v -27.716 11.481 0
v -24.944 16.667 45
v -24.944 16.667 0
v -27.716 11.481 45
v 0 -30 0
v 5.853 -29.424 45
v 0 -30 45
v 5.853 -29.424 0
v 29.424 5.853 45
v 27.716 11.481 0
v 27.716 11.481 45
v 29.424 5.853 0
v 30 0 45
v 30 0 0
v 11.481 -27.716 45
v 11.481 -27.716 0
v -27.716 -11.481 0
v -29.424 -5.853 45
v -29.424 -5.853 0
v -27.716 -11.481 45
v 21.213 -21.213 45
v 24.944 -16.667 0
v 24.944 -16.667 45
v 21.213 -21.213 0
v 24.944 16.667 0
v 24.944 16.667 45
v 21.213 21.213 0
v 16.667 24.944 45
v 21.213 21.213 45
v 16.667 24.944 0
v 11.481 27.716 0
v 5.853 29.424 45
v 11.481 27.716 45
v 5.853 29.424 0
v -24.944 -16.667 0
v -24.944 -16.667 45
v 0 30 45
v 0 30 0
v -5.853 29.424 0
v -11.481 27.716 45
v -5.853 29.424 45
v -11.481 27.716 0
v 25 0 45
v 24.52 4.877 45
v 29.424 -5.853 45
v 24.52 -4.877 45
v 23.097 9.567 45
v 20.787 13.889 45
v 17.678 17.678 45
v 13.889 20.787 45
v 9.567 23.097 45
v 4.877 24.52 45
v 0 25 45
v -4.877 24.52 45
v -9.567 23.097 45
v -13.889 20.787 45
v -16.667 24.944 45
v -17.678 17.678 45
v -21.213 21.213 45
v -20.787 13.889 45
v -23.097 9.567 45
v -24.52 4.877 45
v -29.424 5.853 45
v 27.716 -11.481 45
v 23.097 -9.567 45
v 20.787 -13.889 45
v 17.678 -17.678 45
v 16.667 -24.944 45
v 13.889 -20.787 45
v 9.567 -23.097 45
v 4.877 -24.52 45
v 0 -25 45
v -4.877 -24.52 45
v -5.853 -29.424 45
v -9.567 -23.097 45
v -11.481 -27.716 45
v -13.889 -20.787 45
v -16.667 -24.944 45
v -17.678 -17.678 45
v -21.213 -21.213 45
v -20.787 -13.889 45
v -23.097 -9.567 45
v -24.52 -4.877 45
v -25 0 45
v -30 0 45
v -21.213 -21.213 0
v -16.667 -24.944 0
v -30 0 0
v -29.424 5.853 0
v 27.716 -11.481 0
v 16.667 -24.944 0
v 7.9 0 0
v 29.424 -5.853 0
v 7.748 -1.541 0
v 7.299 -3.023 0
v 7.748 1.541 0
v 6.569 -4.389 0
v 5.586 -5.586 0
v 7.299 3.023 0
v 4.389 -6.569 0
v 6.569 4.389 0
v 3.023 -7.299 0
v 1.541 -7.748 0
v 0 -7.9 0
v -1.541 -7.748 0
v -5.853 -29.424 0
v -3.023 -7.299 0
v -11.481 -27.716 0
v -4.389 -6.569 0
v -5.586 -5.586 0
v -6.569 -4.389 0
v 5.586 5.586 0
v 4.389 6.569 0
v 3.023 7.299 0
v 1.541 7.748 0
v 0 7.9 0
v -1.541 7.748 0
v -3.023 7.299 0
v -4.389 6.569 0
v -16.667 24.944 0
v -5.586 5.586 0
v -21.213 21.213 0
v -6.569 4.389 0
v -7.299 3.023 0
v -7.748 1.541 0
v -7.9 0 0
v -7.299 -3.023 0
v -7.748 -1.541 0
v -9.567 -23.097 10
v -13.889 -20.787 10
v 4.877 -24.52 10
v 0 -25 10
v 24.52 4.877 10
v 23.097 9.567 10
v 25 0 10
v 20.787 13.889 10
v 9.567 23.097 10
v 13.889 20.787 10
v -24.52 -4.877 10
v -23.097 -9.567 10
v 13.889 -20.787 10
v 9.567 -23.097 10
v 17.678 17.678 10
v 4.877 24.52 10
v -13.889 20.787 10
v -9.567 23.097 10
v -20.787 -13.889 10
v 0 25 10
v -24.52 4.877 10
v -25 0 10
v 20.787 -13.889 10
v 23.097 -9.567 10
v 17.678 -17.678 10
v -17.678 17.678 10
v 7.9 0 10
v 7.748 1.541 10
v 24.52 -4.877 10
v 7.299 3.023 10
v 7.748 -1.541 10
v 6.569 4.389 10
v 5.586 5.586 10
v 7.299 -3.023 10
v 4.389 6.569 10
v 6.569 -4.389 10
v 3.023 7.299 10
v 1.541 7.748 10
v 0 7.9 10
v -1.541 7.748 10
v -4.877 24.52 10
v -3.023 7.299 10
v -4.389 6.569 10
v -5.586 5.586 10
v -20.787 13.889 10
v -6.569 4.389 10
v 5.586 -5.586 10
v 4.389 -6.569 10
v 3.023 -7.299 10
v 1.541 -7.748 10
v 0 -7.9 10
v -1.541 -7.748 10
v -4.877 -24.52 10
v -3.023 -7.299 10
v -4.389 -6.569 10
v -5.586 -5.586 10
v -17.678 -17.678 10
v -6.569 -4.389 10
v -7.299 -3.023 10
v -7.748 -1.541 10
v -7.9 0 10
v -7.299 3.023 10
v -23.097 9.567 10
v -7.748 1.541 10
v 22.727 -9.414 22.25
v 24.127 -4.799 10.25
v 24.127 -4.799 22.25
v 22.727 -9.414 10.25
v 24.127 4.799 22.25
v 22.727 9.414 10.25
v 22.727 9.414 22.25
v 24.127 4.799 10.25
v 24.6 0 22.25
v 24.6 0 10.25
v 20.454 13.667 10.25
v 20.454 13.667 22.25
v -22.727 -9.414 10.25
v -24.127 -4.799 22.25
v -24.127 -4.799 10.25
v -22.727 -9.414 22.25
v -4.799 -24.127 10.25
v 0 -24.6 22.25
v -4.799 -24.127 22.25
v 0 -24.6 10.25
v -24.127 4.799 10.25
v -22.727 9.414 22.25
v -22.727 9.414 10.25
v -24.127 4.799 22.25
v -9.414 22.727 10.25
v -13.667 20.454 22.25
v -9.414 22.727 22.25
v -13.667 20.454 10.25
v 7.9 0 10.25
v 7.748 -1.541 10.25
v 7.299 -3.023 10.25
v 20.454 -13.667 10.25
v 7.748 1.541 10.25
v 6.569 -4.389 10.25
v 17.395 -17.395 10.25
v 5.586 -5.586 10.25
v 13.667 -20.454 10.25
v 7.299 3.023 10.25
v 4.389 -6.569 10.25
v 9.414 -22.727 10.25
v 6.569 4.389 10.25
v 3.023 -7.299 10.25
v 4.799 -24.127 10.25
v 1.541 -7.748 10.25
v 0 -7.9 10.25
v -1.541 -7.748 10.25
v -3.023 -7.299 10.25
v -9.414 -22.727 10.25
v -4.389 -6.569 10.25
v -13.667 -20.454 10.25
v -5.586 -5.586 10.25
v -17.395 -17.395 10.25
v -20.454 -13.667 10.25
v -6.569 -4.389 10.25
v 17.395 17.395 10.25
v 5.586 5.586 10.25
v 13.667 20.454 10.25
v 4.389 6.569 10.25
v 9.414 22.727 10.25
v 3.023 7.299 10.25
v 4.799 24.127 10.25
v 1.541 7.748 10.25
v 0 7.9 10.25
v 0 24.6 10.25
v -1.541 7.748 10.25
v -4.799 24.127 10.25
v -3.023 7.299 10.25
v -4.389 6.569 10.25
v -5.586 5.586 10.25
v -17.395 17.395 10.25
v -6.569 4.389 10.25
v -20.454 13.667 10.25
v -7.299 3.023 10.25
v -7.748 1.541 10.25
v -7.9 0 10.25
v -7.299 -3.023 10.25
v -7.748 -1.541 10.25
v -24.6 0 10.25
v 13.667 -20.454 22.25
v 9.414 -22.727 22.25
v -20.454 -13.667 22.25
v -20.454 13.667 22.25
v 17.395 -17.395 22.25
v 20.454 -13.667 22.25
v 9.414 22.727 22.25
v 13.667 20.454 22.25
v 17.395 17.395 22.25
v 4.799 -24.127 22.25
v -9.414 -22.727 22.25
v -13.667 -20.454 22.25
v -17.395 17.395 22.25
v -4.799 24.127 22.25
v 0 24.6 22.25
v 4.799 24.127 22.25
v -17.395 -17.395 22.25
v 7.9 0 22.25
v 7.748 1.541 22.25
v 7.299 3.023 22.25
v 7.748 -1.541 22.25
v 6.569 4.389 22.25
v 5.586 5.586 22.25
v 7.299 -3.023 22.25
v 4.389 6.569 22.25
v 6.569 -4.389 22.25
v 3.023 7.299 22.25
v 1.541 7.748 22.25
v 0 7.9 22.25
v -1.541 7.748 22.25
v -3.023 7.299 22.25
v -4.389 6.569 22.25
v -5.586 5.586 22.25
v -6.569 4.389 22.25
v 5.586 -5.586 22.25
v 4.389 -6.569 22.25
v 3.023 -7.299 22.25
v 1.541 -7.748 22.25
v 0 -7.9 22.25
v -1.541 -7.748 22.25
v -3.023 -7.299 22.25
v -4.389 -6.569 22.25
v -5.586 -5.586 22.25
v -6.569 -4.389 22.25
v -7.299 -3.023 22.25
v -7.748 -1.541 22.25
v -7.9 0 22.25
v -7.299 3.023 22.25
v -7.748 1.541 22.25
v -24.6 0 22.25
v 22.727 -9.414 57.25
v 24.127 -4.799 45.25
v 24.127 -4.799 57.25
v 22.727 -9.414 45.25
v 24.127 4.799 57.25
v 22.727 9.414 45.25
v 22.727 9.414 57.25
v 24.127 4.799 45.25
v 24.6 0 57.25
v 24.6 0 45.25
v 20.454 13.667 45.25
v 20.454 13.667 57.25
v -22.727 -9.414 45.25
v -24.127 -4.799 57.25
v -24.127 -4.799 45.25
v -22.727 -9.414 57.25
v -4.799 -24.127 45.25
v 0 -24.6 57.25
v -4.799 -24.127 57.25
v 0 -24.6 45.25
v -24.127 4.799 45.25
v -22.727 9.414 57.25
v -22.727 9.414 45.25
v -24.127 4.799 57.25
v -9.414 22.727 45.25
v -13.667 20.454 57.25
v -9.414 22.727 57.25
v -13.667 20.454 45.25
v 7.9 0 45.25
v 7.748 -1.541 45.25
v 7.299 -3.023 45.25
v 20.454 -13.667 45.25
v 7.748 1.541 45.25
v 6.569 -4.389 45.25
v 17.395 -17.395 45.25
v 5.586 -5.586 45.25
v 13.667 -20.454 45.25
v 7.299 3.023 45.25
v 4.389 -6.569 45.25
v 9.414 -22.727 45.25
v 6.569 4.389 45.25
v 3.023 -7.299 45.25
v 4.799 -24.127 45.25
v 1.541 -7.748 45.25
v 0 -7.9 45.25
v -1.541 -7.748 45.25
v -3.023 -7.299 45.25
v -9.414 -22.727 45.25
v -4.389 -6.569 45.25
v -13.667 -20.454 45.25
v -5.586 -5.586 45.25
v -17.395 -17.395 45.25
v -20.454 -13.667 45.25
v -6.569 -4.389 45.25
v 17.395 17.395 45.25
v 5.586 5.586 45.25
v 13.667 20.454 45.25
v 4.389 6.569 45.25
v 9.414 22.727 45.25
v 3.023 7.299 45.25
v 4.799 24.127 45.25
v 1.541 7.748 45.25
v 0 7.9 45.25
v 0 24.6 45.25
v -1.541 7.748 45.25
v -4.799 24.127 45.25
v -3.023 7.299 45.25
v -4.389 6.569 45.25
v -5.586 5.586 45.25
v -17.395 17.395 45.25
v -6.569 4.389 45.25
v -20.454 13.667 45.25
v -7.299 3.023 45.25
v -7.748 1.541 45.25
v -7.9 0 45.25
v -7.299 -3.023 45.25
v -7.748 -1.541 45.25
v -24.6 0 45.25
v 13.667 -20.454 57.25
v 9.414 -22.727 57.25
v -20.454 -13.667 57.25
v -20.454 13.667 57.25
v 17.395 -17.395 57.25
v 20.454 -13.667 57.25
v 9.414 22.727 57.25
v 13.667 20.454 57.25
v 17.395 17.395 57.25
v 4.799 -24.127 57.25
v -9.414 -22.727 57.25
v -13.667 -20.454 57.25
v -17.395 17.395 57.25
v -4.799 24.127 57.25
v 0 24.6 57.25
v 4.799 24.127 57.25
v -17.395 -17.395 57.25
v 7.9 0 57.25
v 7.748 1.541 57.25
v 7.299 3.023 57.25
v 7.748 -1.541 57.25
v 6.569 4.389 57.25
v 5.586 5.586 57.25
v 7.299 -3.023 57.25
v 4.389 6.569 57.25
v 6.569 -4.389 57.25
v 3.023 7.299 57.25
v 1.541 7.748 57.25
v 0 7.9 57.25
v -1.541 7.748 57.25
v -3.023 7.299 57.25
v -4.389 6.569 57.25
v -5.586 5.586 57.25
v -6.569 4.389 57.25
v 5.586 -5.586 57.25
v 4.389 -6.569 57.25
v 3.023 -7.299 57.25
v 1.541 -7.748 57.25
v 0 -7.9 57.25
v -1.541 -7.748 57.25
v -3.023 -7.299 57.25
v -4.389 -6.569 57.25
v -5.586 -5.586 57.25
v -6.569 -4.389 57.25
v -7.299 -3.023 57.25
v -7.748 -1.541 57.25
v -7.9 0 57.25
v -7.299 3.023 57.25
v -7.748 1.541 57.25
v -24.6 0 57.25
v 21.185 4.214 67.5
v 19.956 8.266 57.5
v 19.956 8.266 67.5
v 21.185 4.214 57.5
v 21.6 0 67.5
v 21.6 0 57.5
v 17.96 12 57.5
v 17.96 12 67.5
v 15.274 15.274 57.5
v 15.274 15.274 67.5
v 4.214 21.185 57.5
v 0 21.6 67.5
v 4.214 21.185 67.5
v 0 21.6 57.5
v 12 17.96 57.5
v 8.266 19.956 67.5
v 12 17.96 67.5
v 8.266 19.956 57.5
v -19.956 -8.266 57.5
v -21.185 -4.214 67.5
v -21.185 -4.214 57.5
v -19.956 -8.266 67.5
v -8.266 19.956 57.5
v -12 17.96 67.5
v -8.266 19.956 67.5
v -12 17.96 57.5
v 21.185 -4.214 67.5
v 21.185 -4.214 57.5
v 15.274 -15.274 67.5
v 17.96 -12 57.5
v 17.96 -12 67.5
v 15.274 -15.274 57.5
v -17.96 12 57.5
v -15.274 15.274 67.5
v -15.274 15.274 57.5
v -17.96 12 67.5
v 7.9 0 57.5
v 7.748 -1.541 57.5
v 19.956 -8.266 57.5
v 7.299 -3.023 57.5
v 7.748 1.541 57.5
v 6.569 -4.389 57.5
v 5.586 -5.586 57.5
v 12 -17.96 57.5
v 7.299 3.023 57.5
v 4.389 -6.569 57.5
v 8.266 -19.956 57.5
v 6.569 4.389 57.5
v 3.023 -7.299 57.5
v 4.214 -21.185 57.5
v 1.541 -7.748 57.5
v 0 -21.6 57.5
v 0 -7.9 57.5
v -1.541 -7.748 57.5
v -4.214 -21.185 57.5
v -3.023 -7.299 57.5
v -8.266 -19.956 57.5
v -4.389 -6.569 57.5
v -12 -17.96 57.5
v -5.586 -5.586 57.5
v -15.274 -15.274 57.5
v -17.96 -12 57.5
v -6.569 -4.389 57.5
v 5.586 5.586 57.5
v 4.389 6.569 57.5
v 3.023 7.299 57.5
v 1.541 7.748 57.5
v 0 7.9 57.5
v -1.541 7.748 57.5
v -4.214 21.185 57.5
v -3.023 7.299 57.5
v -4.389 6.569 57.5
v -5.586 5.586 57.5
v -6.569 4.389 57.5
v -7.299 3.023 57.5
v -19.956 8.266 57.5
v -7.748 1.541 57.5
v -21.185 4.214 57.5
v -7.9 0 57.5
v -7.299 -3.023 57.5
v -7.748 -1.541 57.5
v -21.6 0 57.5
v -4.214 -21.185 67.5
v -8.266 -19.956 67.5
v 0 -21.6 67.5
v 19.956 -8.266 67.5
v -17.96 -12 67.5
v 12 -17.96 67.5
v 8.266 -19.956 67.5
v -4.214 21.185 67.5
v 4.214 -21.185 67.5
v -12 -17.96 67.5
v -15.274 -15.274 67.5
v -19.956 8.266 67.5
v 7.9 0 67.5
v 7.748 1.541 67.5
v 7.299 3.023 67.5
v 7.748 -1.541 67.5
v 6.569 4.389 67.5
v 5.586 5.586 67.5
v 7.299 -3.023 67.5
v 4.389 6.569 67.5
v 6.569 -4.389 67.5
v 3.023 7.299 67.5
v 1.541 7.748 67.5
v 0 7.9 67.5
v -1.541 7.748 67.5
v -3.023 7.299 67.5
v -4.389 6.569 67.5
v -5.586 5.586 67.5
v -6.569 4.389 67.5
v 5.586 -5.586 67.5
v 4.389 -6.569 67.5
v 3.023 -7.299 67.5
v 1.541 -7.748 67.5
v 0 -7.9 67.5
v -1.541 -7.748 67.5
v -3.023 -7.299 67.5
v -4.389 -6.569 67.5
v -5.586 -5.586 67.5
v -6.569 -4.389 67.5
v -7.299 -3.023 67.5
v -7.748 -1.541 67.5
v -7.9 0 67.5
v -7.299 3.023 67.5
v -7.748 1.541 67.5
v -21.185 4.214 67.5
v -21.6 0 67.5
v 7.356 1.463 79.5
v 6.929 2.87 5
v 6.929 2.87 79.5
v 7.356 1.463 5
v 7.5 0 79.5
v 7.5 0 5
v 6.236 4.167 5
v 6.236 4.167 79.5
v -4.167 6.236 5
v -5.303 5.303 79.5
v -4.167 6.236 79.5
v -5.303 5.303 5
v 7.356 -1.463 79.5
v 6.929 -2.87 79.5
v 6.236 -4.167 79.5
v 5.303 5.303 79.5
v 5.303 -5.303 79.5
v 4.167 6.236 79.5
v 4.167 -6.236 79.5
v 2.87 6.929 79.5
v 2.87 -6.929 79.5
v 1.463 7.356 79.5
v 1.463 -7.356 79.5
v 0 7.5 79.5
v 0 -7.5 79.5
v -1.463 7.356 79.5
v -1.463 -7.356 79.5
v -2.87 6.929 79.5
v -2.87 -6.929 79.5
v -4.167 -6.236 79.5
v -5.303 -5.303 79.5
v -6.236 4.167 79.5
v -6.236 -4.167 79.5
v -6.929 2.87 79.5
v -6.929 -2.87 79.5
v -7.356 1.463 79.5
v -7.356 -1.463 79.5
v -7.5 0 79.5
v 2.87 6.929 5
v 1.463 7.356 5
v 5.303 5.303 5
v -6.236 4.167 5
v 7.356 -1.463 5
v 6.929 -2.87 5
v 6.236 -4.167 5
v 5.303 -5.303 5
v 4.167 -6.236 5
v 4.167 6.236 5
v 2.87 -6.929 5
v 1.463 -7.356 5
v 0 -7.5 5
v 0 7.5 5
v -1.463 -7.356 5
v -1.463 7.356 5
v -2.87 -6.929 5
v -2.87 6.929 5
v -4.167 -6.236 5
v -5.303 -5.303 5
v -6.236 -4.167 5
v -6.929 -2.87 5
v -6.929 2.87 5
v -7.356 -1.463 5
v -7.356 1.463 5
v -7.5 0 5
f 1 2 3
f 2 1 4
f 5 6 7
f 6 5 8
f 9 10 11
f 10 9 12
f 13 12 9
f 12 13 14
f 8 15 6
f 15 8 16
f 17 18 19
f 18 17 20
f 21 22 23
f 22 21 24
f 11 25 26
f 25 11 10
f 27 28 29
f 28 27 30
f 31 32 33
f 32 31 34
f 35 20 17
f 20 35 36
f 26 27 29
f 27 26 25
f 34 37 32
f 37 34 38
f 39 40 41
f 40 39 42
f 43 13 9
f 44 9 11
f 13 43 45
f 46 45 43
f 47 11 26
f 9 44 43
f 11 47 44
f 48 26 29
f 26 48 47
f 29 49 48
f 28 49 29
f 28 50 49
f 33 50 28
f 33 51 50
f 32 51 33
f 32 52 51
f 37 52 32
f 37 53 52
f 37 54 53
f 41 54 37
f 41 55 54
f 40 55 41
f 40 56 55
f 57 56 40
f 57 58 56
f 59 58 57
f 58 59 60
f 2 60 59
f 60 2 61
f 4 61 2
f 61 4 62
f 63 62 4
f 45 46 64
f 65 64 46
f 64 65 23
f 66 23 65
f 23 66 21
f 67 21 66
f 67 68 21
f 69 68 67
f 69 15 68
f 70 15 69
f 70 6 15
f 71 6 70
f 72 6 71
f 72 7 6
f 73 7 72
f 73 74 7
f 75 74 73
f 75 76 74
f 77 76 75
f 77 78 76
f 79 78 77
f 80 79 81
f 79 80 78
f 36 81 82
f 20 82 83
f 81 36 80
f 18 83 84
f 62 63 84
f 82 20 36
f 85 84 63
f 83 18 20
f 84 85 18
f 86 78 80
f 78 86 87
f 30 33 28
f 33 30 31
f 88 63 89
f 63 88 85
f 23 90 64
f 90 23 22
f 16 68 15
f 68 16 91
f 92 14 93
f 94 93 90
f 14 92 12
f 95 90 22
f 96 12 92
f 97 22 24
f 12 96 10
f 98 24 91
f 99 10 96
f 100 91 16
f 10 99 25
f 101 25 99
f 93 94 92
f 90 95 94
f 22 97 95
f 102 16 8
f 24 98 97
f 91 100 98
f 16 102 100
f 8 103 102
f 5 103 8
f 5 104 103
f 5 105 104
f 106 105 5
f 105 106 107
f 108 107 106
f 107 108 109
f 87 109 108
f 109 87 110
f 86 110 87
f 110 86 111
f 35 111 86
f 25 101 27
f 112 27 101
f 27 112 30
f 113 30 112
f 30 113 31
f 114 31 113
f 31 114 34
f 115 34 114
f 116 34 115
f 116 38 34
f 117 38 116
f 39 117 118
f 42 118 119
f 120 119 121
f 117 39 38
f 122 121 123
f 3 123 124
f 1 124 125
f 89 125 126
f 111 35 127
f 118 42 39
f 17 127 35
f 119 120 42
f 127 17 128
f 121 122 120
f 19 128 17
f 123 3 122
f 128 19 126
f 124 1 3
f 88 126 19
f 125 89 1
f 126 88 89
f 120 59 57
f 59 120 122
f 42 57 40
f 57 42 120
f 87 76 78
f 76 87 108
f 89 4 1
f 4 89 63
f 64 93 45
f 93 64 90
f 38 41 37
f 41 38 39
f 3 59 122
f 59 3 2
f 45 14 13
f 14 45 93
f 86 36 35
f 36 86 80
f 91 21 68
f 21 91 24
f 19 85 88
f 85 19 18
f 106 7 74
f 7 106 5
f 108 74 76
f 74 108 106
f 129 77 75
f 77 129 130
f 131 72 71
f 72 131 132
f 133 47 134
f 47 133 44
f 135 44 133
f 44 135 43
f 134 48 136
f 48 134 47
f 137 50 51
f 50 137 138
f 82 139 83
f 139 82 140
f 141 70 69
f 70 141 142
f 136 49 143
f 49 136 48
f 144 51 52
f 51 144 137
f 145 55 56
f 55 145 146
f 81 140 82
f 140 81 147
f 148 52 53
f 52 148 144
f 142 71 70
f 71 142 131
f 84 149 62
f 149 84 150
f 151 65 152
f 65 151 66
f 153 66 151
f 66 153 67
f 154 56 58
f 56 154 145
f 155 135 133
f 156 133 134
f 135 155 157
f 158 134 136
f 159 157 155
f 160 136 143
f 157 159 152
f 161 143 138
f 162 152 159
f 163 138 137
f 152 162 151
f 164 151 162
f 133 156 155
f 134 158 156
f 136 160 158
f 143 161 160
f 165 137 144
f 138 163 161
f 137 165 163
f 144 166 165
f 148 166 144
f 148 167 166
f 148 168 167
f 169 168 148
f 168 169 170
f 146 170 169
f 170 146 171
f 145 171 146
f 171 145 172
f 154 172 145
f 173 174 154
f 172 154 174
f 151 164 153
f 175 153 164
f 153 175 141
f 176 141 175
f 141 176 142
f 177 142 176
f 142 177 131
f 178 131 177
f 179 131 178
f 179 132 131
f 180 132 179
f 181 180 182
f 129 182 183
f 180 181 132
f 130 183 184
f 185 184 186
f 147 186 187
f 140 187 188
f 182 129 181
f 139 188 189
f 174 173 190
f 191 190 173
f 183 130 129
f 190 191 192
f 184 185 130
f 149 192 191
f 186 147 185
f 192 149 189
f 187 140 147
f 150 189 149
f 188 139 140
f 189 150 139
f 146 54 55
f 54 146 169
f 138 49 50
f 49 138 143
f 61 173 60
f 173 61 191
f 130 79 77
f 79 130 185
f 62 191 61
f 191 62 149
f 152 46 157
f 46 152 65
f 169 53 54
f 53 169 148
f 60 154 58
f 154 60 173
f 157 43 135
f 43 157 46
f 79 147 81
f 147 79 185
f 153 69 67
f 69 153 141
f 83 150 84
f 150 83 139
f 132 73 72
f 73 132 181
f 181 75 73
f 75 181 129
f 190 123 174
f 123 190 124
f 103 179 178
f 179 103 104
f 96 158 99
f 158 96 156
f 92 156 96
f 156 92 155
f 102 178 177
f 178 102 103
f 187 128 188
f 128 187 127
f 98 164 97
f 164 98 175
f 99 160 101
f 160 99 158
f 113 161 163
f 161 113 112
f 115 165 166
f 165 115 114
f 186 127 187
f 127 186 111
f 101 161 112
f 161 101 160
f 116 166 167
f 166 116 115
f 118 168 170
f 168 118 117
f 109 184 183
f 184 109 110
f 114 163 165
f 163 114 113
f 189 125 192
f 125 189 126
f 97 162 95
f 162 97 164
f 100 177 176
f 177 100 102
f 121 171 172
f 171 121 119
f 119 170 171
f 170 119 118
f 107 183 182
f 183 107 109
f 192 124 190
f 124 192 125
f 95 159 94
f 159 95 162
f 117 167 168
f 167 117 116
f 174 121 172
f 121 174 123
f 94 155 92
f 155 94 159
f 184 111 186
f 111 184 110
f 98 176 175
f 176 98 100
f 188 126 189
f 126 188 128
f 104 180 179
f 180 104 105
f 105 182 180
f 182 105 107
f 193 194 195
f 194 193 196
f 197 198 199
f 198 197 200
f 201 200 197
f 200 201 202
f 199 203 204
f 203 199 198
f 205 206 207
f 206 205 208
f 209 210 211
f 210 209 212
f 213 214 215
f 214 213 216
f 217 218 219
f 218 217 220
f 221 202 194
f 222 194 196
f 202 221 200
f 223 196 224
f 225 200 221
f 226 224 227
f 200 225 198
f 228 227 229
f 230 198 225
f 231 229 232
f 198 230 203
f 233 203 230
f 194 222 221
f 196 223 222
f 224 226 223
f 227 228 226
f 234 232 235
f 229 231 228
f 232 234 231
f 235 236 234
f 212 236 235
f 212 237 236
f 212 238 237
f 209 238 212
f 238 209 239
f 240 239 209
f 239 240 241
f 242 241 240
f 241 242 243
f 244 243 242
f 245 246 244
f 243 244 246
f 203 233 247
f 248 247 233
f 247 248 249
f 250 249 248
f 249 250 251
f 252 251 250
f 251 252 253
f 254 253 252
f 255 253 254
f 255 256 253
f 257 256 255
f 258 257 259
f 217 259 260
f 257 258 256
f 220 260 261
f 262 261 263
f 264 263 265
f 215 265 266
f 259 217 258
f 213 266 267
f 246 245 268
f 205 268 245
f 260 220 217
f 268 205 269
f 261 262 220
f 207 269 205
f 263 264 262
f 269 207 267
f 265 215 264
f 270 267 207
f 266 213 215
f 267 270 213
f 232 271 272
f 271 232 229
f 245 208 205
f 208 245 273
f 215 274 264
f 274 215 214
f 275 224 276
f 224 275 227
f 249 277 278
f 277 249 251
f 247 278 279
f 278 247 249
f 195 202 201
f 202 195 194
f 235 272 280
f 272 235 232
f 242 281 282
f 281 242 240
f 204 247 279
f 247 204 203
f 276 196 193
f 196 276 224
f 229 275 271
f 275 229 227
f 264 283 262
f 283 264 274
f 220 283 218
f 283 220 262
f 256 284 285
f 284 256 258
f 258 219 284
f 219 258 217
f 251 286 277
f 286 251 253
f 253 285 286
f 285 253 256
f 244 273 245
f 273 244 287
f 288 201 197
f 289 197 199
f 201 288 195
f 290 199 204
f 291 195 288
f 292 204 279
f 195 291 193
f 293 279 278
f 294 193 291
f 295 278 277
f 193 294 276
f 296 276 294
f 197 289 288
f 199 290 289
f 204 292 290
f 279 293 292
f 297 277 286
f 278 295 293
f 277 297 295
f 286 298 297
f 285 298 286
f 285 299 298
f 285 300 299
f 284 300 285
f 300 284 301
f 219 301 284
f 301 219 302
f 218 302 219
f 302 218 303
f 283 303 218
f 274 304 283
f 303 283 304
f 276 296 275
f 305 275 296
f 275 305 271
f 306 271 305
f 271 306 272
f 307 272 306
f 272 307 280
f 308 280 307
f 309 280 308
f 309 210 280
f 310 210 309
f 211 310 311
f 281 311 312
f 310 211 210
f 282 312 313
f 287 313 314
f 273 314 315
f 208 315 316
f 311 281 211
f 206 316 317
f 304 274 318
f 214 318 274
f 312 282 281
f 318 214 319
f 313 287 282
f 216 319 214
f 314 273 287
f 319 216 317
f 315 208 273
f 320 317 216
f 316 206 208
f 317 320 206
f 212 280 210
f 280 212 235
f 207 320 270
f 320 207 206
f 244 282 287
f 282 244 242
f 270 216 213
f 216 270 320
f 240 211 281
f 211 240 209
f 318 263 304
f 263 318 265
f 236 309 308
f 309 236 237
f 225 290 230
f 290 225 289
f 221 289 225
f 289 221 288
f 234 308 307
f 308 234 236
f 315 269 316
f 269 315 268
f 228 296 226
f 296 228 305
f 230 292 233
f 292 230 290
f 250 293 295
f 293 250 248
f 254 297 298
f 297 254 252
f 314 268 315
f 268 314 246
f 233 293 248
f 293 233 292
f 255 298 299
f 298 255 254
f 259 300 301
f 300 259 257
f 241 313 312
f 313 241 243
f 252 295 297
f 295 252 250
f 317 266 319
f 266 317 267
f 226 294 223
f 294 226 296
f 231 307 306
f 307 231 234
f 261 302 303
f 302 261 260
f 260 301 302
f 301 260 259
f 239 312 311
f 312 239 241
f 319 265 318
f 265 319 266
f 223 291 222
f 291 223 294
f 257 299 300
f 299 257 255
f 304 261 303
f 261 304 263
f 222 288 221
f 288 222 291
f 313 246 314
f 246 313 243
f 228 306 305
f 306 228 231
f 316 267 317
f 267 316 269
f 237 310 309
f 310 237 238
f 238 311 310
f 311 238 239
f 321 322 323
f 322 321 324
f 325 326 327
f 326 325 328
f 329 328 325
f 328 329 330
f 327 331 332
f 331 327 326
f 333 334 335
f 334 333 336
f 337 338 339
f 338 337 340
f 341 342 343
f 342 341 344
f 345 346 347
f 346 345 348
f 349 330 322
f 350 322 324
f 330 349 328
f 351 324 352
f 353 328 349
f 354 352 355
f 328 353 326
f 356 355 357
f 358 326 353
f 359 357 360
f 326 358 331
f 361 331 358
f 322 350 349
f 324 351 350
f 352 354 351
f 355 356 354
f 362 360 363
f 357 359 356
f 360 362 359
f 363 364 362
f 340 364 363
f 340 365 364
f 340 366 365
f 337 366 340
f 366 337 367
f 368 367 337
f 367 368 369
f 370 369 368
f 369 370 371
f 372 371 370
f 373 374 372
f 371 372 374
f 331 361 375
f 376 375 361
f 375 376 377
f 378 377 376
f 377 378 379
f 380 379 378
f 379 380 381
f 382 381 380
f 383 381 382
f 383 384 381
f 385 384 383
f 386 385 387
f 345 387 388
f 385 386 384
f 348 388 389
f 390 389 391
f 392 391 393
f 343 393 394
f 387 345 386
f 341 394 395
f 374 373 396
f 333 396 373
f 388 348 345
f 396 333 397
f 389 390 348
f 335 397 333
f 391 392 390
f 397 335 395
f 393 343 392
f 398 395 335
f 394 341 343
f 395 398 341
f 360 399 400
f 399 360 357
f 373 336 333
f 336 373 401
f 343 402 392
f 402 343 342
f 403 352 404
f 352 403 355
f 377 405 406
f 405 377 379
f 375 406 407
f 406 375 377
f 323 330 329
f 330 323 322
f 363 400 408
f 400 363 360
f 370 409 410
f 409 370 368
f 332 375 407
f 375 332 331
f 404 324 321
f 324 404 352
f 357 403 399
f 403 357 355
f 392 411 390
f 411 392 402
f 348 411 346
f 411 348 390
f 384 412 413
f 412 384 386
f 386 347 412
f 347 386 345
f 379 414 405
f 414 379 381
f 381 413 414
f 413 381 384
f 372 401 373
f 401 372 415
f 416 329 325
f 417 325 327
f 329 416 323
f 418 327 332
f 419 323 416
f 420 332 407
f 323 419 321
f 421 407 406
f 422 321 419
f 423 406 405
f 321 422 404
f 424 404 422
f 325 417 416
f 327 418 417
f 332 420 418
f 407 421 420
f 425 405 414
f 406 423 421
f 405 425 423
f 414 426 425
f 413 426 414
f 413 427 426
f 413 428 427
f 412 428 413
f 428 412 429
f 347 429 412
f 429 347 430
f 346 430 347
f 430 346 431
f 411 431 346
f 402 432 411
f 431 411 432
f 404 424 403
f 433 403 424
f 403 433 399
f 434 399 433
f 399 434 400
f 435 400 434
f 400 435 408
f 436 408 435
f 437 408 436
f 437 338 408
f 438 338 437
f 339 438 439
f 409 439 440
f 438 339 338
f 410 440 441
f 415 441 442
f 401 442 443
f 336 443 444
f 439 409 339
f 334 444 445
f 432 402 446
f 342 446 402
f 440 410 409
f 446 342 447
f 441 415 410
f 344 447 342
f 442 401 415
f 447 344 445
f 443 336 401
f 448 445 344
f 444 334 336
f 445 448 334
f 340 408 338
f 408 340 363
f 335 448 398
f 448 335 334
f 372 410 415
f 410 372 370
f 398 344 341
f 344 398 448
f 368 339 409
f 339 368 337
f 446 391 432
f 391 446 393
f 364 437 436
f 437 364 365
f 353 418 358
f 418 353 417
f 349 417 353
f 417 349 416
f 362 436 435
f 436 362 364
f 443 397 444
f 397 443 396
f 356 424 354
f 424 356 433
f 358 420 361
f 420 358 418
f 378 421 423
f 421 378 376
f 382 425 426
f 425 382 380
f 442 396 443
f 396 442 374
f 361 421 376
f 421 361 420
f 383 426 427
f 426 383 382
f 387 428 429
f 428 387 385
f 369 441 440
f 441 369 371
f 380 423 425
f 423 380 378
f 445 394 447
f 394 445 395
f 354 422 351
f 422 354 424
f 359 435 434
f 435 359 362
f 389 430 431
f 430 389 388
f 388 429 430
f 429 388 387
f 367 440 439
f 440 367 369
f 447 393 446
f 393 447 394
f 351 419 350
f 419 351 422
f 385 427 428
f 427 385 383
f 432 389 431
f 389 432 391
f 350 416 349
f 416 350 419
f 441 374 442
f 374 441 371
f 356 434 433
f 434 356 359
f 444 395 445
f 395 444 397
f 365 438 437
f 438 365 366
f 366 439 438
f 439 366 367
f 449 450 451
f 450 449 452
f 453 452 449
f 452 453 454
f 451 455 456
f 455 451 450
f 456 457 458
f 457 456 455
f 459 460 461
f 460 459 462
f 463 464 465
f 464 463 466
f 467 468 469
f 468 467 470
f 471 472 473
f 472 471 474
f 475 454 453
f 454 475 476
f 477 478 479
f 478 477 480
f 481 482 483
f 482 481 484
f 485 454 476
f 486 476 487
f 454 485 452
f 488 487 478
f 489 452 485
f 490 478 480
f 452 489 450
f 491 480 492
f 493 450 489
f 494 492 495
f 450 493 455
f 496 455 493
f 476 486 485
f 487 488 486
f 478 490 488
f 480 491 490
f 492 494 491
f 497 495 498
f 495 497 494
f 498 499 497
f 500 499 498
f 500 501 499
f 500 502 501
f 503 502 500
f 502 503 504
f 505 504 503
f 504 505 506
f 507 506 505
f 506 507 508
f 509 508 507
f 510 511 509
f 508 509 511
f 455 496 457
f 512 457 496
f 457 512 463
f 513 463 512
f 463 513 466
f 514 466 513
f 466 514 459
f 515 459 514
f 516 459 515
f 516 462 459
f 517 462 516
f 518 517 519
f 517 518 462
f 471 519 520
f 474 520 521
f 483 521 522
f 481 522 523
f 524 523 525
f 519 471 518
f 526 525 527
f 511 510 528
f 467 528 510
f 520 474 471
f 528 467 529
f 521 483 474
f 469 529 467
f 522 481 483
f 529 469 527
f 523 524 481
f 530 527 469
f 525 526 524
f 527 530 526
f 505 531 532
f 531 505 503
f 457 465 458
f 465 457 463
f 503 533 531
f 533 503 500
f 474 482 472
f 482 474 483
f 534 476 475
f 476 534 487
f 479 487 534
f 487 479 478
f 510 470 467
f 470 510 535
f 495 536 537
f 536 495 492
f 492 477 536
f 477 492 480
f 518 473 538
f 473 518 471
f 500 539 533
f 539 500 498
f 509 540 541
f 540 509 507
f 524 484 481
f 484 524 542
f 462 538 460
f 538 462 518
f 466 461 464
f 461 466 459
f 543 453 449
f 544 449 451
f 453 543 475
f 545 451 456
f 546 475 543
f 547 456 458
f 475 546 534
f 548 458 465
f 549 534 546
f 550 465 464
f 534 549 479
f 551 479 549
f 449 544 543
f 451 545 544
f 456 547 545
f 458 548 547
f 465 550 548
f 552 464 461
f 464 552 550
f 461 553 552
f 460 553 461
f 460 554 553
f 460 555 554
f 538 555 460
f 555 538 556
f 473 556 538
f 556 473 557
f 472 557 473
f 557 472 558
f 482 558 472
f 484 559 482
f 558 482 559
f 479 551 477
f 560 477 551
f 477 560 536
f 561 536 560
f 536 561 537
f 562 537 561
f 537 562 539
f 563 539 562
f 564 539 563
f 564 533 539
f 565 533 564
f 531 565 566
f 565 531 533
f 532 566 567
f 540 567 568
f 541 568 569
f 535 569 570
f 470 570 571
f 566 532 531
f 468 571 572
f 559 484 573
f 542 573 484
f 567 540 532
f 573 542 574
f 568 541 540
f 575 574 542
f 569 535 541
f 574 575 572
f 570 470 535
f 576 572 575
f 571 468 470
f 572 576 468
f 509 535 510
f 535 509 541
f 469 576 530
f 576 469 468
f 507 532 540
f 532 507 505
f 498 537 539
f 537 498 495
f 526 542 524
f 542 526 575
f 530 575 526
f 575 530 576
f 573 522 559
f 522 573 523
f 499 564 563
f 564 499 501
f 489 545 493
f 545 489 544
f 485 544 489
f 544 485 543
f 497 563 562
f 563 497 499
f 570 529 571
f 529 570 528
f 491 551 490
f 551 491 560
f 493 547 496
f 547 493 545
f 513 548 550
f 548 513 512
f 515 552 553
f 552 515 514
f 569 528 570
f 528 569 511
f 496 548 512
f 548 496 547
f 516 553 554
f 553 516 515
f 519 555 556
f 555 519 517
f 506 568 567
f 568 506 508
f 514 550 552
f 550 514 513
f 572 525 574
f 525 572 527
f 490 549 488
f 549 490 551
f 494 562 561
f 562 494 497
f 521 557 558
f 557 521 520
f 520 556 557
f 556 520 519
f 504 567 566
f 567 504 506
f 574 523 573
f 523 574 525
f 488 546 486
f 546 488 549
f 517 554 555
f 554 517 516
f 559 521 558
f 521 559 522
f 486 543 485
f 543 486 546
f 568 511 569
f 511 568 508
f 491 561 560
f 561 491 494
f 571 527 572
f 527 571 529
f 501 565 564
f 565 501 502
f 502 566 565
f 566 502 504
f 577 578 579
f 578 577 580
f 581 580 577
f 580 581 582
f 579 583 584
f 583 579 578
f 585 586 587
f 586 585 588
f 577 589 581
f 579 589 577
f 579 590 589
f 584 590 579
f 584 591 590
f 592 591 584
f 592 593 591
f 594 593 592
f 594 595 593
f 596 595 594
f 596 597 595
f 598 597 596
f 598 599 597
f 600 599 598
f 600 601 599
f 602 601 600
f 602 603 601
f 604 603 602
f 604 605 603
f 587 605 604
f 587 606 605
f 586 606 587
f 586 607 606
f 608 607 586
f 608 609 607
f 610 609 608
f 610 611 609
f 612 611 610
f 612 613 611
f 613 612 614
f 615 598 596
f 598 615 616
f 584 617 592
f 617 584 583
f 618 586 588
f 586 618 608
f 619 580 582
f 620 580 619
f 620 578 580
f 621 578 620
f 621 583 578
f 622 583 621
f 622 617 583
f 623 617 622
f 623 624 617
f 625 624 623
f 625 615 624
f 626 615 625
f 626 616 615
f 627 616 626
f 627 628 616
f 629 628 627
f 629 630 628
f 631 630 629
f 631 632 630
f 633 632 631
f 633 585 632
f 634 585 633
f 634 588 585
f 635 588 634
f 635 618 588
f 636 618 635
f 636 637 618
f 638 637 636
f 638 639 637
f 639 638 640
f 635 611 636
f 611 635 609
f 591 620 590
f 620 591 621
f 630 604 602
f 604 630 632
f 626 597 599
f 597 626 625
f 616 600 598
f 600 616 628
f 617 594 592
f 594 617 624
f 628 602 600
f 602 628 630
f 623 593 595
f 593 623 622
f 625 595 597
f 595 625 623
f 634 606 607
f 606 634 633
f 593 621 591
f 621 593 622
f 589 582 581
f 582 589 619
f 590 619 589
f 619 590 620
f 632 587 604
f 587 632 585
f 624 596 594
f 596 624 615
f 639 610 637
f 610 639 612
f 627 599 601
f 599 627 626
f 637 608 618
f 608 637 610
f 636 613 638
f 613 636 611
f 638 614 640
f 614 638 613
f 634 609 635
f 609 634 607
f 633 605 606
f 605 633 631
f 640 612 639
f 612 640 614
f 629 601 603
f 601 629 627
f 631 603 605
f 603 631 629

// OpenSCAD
$fn = 32;

// ------------------------------------------------------------------------
// Bearing housing: housing d60, two bearings and a shaft
// Every part is its own module, assembly() places them once.
// ------------------------------------------------------------------------

// --- part 1 ---
module housing() {
  difference() {
    cylinder(h = 45, d = 60);
    translate([0, 0, 10]) cylinder(h = 36, d = 50);
    translate([0, 0, -1]) cylinder(h = 12, d = 15.8);
  }
}

// --- part 2 ---
module bearing_lower() {
  difference() {
      translate([0, 0, 0]) cylinder(h = 12, d = 49.2);
      translate([0, 0, -1]) cylinder(h = 14, d = 15.8);
    }
}

// --- part 3 ---
module bearing_upper() {
  difference() {
      translate([0, 0, 0]) cylinder(h = 12, d = 49.2);
      translate([0, 0, -1]) cylinder(h = 14, d = 15.8);
    }
}

// --- part 4 ---
module spacer() {
  difference() {
      translate([0, 0, 0]) cylinder(h = 10, d = 43.2);
      translate([0, 0, -1]) cylinder(h = 12, d = 15.8);
    }
}

// --- part 5 ---
module shaft() {
  translate([0, 0, -37.25]) cylinder(h = 74.5, d = 15);
}

// --- assembly ---
module assembly() {
  translate([0, 0, 0]) rotate([0, 0, 0]) housing();
  translate([0, 0, 10.25]) rotate([0, 0, 0]) bearing_lower();
  translate([0, 0, 45.25]) rotate([0, 0, 0]) bearing_upper();
  translate([0, 0, 57.5]) rotate([0, 0, 0]) spacer();
  translate([0, 0, 42.25]) rotate([0, 0, 0]) shaft();
}

assembly();
